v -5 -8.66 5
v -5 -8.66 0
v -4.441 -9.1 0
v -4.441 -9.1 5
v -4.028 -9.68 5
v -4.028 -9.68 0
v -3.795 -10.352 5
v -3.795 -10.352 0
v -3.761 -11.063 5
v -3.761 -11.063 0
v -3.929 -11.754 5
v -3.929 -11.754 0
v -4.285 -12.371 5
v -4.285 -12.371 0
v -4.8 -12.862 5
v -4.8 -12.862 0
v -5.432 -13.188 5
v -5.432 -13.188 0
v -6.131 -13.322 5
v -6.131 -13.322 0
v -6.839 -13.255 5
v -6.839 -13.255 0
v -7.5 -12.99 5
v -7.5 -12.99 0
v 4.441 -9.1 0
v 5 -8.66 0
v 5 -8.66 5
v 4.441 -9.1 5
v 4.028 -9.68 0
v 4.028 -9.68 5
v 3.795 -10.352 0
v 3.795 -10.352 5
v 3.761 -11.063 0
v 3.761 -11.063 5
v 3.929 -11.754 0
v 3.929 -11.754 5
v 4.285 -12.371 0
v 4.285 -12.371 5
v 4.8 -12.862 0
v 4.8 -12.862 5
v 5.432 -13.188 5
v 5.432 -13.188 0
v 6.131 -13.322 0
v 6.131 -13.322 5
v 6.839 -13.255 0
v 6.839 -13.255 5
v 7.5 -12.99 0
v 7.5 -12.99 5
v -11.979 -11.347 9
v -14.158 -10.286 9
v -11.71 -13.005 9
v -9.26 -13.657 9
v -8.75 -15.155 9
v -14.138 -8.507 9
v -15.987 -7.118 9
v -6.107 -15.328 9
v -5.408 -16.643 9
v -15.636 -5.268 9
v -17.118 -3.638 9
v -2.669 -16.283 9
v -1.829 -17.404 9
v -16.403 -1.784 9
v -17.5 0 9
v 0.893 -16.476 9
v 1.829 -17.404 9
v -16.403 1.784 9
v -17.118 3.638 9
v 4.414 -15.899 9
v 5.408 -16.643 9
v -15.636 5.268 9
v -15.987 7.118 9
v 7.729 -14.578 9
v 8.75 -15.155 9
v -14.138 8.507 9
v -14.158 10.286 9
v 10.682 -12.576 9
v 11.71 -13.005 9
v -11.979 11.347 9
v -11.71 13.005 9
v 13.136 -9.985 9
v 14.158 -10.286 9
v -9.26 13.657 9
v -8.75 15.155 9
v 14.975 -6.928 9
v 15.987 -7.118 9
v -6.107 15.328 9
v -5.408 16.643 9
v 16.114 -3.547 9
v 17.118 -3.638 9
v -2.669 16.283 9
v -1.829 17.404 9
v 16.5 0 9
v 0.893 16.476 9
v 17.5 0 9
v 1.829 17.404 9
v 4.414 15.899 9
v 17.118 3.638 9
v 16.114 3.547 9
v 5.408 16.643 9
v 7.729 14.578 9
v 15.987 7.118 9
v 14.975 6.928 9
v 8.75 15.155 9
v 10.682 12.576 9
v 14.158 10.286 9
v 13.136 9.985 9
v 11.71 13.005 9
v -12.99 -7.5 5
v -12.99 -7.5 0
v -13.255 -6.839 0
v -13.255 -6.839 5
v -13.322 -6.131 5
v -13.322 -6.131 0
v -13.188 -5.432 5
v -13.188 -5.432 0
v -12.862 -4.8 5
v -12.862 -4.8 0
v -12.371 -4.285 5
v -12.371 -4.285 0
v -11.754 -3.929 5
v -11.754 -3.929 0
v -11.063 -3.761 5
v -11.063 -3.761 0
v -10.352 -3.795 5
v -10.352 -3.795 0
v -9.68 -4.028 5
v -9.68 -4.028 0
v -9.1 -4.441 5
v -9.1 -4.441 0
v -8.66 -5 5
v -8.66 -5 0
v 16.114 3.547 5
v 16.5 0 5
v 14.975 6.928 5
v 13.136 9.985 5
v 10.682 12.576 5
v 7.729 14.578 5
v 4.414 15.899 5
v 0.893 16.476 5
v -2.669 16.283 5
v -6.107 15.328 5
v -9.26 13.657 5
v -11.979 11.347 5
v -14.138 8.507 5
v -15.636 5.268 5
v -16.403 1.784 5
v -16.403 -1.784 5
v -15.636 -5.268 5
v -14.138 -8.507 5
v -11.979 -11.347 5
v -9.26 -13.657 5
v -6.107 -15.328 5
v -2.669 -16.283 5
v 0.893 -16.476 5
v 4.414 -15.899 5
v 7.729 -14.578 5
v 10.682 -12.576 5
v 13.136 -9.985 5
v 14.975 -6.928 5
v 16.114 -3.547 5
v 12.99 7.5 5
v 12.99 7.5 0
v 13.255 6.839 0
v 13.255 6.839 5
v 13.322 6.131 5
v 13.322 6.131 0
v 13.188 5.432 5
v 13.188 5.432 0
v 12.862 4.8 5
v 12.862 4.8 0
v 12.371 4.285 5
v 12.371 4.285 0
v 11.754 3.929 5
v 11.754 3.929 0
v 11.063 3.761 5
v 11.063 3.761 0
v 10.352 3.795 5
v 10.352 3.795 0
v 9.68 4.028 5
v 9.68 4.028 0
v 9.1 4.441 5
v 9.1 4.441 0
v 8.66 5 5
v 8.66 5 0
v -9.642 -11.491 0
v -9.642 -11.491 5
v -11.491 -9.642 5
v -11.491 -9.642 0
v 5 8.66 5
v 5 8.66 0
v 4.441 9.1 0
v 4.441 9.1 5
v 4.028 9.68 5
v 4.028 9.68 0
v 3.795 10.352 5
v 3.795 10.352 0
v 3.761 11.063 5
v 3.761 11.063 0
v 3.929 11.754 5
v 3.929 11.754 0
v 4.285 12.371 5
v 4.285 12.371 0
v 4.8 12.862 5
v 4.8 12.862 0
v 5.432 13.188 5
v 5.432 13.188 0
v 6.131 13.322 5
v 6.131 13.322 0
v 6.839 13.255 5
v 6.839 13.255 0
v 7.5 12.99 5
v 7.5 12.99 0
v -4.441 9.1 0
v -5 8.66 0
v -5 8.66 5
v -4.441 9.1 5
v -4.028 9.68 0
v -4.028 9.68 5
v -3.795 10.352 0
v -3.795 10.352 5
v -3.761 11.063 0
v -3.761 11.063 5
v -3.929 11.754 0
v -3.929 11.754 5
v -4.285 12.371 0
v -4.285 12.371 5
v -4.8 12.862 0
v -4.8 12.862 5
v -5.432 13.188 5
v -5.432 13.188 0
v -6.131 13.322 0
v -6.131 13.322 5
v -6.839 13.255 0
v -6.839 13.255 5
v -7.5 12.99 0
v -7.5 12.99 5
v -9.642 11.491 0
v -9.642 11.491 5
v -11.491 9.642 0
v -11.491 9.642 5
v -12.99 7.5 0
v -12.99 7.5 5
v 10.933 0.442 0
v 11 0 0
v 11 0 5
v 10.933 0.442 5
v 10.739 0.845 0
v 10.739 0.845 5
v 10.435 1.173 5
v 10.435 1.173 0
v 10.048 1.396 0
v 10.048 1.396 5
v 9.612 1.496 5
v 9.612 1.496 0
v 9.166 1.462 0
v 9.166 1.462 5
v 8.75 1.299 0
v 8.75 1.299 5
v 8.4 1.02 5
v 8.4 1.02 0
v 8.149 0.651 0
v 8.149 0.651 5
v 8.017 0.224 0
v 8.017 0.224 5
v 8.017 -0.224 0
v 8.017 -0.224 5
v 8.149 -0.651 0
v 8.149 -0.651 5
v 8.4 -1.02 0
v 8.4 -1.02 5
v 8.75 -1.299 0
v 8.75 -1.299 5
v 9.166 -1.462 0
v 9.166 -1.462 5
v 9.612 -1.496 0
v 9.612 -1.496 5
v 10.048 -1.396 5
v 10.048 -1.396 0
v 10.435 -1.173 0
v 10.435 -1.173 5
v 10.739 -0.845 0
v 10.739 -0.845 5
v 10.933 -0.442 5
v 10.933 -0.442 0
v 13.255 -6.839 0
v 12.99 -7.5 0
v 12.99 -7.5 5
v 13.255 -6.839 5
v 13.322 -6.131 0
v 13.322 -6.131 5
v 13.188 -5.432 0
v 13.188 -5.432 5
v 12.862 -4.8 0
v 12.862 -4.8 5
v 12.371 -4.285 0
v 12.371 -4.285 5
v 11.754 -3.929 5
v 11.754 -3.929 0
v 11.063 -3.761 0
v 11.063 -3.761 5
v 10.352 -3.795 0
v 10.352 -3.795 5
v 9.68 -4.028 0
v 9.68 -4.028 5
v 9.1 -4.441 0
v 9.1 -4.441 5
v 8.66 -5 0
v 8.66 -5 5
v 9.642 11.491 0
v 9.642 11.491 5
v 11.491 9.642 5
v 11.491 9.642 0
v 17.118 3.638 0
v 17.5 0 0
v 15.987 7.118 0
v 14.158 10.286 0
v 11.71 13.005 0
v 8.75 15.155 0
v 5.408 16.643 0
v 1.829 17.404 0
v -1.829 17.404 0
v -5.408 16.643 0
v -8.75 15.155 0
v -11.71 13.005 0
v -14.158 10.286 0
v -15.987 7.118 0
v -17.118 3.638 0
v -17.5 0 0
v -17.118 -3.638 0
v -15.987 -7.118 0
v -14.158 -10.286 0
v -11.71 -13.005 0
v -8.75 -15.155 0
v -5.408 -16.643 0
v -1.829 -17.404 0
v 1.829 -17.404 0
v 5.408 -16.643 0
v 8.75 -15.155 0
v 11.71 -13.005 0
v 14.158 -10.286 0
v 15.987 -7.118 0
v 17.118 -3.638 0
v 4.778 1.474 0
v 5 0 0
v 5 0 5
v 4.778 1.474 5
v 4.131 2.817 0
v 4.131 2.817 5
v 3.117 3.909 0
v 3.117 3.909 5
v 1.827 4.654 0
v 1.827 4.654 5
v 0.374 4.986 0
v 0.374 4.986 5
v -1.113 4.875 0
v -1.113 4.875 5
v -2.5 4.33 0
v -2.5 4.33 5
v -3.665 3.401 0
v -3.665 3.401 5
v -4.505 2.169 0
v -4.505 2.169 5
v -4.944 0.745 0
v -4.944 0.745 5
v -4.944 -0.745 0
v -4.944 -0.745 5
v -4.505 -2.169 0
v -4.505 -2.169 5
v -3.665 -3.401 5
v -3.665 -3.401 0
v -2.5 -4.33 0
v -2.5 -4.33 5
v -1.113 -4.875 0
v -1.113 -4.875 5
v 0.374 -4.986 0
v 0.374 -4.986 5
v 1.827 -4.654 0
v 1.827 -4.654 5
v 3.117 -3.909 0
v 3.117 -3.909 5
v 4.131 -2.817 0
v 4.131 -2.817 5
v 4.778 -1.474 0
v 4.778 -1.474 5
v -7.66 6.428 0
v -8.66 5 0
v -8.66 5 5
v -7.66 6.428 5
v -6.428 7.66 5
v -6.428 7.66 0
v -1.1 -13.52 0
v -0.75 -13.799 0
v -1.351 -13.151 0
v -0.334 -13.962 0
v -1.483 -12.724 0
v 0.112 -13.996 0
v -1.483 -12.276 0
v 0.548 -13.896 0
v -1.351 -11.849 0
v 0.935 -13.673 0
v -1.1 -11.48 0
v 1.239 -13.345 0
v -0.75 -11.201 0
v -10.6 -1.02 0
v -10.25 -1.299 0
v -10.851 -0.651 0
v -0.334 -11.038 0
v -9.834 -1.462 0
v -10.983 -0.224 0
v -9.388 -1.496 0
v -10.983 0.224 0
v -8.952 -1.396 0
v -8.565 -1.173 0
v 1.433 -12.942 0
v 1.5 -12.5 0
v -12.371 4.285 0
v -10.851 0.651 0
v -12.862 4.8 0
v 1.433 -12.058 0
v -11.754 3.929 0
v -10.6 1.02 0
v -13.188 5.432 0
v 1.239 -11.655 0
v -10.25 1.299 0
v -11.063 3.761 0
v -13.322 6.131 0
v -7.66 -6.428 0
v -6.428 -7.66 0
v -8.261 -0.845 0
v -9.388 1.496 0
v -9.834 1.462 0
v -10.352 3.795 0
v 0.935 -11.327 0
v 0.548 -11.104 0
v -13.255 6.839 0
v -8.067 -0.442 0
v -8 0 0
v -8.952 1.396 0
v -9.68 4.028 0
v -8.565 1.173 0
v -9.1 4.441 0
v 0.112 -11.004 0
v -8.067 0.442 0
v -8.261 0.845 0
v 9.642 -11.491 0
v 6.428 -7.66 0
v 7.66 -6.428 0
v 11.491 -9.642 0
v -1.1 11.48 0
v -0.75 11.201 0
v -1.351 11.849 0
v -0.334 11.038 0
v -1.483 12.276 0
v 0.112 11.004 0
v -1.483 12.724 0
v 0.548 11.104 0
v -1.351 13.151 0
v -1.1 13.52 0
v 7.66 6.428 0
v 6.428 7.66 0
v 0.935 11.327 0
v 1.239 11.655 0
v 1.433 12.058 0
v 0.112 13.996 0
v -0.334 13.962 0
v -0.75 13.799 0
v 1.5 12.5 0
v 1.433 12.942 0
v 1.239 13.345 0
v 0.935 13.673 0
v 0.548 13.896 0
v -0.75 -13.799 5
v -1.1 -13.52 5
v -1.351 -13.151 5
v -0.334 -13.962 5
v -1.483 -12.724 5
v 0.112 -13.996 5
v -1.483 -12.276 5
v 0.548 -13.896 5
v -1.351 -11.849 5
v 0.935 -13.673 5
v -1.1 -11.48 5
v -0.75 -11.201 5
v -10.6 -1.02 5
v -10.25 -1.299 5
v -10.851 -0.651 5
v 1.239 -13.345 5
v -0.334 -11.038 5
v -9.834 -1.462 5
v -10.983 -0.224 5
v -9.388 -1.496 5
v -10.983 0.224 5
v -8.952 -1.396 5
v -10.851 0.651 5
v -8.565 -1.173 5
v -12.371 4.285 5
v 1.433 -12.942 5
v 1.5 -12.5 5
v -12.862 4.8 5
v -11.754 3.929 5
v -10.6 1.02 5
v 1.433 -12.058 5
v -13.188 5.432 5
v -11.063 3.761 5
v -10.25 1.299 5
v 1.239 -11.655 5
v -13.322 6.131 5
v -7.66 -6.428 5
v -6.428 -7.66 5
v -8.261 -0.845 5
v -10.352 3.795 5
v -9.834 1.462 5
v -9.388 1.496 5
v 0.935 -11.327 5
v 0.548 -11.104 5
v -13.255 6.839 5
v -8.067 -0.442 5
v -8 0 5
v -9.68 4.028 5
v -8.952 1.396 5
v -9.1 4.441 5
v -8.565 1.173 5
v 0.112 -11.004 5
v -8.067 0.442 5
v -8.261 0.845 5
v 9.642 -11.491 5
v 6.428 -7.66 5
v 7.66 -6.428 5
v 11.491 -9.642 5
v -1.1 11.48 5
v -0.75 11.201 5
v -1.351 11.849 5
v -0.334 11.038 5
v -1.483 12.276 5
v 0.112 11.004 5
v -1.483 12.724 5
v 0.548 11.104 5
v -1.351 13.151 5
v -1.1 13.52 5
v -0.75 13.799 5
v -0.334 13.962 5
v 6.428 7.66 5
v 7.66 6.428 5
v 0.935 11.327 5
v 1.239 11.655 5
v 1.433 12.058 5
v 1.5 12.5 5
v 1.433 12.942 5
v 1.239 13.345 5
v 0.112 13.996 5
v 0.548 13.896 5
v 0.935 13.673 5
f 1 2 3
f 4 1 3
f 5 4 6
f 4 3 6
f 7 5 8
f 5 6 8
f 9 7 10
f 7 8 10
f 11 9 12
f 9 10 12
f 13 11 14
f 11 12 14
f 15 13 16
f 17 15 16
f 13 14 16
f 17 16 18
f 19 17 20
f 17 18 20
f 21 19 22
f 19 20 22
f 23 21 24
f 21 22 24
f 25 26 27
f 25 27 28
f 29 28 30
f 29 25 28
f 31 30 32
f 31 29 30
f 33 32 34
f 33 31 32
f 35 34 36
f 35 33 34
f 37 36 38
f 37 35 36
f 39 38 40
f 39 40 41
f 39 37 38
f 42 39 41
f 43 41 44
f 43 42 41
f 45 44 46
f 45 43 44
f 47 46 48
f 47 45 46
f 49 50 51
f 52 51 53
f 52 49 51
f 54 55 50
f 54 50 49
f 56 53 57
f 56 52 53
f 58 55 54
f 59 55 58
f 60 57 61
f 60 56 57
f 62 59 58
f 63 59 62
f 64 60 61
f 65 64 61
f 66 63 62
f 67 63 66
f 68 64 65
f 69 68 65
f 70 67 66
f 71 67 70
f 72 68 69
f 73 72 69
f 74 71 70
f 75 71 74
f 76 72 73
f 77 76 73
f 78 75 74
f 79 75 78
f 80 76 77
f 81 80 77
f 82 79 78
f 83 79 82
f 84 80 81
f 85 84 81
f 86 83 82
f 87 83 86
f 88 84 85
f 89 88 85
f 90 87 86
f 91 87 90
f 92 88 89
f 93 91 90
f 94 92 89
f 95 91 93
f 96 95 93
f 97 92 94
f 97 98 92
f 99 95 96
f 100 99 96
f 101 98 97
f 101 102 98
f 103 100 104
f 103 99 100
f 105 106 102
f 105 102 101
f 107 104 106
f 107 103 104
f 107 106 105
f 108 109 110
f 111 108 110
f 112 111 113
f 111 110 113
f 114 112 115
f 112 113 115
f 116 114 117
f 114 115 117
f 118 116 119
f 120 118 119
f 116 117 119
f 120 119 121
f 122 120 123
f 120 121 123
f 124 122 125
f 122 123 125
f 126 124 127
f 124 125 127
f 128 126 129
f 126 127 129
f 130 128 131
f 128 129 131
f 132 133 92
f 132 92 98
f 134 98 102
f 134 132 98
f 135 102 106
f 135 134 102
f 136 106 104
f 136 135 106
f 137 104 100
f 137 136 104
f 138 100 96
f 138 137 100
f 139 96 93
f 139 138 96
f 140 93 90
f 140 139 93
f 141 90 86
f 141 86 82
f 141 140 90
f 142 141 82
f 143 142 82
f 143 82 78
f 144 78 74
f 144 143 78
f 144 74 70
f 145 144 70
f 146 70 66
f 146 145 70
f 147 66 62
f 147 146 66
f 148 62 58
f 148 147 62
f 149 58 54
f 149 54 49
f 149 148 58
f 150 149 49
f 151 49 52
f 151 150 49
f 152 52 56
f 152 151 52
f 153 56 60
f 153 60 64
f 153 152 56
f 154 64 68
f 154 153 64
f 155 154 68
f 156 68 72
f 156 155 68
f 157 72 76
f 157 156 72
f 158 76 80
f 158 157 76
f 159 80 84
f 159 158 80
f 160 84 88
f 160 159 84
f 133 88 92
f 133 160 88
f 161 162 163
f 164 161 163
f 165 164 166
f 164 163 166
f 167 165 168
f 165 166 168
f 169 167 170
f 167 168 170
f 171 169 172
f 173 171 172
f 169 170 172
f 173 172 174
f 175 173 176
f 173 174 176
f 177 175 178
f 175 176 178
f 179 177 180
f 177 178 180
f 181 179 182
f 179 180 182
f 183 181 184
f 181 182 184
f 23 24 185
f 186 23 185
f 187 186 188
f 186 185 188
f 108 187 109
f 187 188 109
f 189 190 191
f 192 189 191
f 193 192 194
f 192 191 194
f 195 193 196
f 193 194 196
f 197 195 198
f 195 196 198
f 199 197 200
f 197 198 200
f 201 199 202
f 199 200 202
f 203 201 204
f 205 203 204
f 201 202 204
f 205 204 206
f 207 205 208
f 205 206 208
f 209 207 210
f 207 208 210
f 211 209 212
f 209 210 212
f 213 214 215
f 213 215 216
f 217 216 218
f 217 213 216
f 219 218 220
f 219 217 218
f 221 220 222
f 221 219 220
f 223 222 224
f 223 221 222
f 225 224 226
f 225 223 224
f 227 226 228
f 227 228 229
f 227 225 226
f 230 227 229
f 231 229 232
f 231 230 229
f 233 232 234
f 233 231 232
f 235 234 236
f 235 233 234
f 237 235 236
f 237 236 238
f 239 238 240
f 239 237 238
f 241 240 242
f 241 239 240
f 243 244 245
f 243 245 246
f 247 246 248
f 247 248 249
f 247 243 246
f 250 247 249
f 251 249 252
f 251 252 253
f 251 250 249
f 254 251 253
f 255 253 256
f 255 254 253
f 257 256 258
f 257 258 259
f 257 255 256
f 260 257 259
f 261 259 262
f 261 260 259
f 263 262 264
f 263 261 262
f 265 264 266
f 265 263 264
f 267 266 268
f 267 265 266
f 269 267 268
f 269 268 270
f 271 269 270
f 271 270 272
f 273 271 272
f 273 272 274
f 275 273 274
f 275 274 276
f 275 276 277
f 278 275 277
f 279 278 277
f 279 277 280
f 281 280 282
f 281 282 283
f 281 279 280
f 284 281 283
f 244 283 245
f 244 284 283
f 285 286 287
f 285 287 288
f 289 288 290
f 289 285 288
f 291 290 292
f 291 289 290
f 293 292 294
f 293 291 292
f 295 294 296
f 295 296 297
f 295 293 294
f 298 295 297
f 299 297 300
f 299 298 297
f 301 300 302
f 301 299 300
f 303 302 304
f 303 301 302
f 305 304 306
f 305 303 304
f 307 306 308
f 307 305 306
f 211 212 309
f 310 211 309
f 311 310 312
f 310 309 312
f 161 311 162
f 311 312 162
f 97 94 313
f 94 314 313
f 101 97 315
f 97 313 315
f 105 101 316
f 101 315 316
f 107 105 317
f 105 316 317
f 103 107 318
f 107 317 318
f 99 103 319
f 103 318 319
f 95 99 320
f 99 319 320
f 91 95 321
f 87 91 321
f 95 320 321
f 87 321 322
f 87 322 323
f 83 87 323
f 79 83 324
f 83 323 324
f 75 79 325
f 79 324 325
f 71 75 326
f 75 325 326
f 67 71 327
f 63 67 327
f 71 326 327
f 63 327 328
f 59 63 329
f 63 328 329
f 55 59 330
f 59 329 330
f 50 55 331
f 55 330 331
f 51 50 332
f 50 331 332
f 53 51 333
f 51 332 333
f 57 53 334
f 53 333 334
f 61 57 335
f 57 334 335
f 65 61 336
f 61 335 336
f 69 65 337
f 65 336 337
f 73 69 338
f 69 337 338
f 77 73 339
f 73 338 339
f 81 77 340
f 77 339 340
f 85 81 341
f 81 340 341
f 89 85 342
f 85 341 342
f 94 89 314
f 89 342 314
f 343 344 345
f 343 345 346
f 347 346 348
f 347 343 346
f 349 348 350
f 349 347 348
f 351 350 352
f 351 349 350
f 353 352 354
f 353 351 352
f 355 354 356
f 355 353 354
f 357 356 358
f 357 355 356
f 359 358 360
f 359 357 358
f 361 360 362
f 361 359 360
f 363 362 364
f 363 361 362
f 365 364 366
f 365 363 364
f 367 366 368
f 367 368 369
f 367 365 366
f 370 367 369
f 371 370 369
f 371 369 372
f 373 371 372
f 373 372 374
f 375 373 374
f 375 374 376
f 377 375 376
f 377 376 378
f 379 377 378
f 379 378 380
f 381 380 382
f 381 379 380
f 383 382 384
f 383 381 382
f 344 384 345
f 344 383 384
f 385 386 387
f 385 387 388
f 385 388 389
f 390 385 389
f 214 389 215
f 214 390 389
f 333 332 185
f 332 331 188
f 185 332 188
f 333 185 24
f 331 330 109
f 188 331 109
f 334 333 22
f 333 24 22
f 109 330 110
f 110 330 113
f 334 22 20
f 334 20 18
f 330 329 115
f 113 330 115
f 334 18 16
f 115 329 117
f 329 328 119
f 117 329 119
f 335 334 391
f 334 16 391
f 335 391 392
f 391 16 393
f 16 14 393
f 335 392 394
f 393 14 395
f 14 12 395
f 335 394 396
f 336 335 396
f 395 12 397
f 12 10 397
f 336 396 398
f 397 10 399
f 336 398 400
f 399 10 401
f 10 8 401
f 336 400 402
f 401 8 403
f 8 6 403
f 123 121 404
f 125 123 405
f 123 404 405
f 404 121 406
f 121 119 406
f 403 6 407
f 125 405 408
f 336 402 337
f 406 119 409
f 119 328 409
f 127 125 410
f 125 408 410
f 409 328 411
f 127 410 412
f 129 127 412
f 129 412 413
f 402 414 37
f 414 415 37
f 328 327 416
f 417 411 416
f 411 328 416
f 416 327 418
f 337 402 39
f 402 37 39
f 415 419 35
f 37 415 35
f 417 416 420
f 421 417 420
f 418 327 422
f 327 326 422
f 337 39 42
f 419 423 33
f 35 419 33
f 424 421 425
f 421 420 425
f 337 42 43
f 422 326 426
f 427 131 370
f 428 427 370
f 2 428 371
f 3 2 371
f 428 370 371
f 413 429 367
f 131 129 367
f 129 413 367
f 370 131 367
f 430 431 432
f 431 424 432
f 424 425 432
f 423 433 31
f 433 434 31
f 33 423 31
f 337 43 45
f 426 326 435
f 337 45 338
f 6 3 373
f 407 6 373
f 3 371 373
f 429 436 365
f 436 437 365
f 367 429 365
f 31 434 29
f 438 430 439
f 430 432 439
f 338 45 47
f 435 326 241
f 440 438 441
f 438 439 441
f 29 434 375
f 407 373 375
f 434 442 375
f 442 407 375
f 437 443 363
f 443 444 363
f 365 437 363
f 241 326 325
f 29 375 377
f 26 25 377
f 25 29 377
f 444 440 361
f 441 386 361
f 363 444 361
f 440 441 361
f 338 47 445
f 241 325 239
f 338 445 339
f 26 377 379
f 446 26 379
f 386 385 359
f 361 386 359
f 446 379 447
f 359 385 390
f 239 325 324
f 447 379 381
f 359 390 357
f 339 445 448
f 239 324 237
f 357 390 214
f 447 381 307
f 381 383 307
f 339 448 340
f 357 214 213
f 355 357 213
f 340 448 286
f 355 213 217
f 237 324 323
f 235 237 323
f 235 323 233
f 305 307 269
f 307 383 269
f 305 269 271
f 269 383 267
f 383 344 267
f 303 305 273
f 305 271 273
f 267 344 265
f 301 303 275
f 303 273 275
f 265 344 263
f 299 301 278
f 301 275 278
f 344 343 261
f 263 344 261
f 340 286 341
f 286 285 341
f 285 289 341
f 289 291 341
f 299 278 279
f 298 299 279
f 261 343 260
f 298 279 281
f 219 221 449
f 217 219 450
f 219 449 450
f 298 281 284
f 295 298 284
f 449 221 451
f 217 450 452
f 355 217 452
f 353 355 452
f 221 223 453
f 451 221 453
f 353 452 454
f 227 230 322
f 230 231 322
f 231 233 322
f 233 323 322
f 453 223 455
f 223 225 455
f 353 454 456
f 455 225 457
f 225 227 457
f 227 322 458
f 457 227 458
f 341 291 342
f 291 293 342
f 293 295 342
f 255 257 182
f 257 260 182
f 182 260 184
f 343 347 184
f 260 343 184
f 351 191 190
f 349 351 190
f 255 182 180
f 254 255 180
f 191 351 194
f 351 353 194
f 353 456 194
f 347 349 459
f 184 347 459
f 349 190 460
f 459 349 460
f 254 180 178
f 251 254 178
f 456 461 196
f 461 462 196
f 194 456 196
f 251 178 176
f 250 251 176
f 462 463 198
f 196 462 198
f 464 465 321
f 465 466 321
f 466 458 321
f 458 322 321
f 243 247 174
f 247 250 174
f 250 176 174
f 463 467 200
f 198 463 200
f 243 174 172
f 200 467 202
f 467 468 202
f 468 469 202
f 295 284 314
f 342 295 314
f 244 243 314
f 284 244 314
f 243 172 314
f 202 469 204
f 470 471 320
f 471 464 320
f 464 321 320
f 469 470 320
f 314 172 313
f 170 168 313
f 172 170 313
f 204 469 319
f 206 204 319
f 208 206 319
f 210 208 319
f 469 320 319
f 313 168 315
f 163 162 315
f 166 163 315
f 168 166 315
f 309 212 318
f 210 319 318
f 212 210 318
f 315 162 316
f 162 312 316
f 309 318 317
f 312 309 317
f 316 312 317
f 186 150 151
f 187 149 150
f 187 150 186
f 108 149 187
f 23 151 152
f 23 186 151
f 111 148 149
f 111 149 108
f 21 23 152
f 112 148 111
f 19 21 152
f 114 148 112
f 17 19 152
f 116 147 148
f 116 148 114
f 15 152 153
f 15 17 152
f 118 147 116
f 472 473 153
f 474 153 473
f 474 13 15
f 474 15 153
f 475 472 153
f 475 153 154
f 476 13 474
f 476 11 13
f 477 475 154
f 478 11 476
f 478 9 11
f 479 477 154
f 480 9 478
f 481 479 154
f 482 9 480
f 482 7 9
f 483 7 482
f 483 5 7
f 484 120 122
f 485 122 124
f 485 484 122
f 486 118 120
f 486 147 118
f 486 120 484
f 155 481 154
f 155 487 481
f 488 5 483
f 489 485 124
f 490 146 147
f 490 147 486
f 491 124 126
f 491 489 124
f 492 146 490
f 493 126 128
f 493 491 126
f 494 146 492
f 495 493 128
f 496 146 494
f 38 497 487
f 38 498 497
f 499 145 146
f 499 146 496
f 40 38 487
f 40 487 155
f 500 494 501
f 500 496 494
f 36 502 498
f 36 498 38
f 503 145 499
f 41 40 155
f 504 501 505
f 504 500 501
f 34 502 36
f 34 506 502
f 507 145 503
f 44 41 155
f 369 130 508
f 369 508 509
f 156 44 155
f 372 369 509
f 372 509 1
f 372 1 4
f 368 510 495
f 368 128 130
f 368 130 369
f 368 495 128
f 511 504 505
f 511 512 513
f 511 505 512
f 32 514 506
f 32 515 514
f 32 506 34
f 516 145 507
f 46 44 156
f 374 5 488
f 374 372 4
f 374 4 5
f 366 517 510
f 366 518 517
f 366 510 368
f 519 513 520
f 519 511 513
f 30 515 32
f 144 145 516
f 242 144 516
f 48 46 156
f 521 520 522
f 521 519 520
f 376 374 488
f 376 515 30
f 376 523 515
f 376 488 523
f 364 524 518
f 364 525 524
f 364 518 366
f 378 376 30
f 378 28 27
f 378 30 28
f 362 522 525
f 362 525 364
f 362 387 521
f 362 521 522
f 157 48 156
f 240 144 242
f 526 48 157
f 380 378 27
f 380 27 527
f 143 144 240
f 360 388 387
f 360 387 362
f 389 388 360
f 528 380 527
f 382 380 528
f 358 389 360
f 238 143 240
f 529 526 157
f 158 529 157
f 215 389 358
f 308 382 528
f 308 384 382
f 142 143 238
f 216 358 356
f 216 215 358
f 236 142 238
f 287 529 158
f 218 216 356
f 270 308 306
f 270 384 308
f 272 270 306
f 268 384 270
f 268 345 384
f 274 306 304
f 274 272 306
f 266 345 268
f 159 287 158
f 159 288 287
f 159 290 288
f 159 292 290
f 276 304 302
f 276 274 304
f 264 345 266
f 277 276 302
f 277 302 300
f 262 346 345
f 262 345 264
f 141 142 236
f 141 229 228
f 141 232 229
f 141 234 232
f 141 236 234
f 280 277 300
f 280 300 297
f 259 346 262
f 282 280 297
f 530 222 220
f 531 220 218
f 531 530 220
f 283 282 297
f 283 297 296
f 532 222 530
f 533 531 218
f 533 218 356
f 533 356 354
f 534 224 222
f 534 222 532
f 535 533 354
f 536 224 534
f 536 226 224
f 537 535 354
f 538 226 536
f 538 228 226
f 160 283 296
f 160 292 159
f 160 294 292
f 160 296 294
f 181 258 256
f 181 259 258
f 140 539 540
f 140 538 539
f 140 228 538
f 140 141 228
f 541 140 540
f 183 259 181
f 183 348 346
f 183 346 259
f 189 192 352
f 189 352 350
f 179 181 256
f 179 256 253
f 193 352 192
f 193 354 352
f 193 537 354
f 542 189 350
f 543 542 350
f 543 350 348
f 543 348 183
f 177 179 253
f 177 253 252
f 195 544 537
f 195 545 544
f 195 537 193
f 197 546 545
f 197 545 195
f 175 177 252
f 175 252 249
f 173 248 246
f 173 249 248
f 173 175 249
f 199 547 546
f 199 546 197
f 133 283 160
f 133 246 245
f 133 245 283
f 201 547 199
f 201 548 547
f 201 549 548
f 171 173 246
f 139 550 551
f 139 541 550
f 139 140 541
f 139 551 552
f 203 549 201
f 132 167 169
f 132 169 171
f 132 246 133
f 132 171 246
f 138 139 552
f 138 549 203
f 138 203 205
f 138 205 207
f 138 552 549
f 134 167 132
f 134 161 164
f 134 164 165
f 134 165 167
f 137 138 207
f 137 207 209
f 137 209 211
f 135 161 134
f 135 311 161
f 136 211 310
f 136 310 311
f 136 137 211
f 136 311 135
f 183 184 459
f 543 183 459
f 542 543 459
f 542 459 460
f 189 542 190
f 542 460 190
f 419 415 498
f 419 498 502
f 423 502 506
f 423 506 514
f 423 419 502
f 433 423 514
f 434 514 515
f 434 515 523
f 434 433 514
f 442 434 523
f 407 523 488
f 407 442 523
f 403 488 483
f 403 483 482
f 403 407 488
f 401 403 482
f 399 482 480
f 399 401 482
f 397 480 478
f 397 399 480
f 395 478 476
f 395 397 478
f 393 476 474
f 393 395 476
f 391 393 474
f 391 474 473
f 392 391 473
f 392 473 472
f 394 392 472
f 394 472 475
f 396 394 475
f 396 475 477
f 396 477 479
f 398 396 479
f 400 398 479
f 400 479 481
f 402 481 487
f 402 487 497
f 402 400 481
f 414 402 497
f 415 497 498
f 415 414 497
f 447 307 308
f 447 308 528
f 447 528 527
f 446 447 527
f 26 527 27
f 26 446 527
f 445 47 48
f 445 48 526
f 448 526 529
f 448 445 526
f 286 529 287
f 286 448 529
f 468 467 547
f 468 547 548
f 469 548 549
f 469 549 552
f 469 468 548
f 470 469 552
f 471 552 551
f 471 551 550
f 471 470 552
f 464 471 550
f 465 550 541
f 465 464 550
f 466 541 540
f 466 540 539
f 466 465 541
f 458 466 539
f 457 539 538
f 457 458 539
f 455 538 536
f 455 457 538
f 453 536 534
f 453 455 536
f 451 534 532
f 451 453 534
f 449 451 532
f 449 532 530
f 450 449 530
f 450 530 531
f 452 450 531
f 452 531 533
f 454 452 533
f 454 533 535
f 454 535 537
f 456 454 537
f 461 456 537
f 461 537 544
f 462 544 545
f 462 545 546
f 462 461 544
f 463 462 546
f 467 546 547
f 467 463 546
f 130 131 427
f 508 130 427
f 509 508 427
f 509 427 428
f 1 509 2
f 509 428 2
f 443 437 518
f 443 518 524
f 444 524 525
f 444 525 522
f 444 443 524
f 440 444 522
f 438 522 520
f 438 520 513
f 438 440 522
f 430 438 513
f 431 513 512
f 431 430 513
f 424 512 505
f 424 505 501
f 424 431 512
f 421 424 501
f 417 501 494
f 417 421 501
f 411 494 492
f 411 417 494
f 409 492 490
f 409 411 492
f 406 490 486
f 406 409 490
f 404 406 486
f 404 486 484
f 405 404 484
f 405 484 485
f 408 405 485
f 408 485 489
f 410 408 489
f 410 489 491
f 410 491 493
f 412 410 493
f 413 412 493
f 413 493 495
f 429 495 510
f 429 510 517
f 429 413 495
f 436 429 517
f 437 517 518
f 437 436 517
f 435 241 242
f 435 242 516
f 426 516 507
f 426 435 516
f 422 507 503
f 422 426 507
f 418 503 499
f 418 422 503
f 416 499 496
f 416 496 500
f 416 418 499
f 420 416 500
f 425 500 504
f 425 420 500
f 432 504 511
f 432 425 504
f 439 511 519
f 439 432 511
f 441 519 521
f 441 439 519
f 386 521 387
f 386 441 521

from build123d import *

# Parameters (mm, degrees)
SKETCH1_R           = 17.5
SKETCH1_R_2         = 1.5
SKETCH1_R_3         = 5
BOSS_EXTRUDE1_DEPTH = 5
SKETCH2_R           = 17.5
SKETCH2_R_2         = 16.5
EXTRUDE_THIN1_DEPTH = 4


with BuildPart() as part:
    # Sketch1 → Boss-Extrude1 (new body)
    with BuildSketch(Plane.XY):
        Circle(SKETCH1_R)
        with Locations((0, 12.5)):
            Circle(SKETCH1_R_2, mode=Mode.SUBTRACT)
        with Locations((0, -12.5)):
            Circle(SKETCH1_R_2, mode=Mode.SUBTRACT)
        Circle(SKETCH1_R_3, mode=Mode.SUBTRACT)
        with Locations((9.5, 0)):
            Circle(SKETCH1_R_2, mode=Mode.SUBTRACT)
        with Locations((-9.5, 0)):
            Circle(SKETCH1_R_2, mode=Mode.SUBTRACT)
        with BuildLine():
            ThreePointArc((-8.660254038, -5), (-7.071067812, -7.071067812), (-5, -8.660254038))
            ThreePointArc((-5, -8.660254038), (-4.084936491, -12.075317547), (-7.5, -12.990381057))
            ThreePointArc((-7.5, -12.990381057), (-10.606601718, -10.606601718), (-12.990381057, -7.5))
            ThreePointArc((-12.990381057, -7.5), (-12.075317547, -4.084936491), (-8.660254038, -5))
        make_face(mode=Mode.SUBTRACT)
        with BuildLine():
            ThreePointArc((-5, 8.660254038), (-4.084936491, 12.075317547), (-7.5, 12.990381057))
            ThreePointArc((-7.5, 12.990381057), (-10.606601718, 10.606601718), (-12.990381057, 7.5))
            ThreePointArc((-12.990381057, 7.5), (-12.075317547, 4.084936491), (-8.660254038, 5))
            ThreePointArc((-8.660254038, 5), (-7.071067812, 7.071067812), (-5, 8.660254038))
        make_face(mode=Mode.SUBTRACT)
        with BuildLine():
            ThreePointArc((5, -8.660254038), (4.084936491, -12.075317547), (7.5, -12.990381057))
            ThreePointArc((7.5, -12.990381057), (10.606601718, -10.606601718), (12.990381057, -7.5))
            ThreePointArc((12.990381057, -7.5), (12.075317547, -4.084936491), (8.660254038, -5))
            ThreePointArc((8.660254038, -5), (7.071067812, -7.071067812), (5, -8.660254038))
        make_face(mode=Mode.SUBTRACT)
        with BuildLine():
            ThreePointArc((12.990381057, 7.5), (12.075317547, 4.084936491), (8.660254038, 5))
            ThreePointArc((8.660254038, 5), (7.071067812, 7.071067812), (5, 8.660254038))
            ThreePointArc((5, 8.660254038), (4.084936491, 12.075317547), (7.5, 12.990381057))
            ThreePointArc((7.5, 12.990381057), (10.606601718, 10.606601718), (12.990381057, 7.5))
        make_face(mode=Mode.SUBTRACT)
    extrude(amount=BOSS_EXTRUDE1_DEPTH)

    # Sketch2 → Extrude-Thin1 (add)
    with BuildSketch(Plane.XY.offset(5)):
        Circle(SKETCH2_R)
        Circle(SKETCH2_R_2, mode=Mode.SUBTRACT)
    extrude(amount=EXTRUDE_THIN1_DEPTH)


solid = part.part
